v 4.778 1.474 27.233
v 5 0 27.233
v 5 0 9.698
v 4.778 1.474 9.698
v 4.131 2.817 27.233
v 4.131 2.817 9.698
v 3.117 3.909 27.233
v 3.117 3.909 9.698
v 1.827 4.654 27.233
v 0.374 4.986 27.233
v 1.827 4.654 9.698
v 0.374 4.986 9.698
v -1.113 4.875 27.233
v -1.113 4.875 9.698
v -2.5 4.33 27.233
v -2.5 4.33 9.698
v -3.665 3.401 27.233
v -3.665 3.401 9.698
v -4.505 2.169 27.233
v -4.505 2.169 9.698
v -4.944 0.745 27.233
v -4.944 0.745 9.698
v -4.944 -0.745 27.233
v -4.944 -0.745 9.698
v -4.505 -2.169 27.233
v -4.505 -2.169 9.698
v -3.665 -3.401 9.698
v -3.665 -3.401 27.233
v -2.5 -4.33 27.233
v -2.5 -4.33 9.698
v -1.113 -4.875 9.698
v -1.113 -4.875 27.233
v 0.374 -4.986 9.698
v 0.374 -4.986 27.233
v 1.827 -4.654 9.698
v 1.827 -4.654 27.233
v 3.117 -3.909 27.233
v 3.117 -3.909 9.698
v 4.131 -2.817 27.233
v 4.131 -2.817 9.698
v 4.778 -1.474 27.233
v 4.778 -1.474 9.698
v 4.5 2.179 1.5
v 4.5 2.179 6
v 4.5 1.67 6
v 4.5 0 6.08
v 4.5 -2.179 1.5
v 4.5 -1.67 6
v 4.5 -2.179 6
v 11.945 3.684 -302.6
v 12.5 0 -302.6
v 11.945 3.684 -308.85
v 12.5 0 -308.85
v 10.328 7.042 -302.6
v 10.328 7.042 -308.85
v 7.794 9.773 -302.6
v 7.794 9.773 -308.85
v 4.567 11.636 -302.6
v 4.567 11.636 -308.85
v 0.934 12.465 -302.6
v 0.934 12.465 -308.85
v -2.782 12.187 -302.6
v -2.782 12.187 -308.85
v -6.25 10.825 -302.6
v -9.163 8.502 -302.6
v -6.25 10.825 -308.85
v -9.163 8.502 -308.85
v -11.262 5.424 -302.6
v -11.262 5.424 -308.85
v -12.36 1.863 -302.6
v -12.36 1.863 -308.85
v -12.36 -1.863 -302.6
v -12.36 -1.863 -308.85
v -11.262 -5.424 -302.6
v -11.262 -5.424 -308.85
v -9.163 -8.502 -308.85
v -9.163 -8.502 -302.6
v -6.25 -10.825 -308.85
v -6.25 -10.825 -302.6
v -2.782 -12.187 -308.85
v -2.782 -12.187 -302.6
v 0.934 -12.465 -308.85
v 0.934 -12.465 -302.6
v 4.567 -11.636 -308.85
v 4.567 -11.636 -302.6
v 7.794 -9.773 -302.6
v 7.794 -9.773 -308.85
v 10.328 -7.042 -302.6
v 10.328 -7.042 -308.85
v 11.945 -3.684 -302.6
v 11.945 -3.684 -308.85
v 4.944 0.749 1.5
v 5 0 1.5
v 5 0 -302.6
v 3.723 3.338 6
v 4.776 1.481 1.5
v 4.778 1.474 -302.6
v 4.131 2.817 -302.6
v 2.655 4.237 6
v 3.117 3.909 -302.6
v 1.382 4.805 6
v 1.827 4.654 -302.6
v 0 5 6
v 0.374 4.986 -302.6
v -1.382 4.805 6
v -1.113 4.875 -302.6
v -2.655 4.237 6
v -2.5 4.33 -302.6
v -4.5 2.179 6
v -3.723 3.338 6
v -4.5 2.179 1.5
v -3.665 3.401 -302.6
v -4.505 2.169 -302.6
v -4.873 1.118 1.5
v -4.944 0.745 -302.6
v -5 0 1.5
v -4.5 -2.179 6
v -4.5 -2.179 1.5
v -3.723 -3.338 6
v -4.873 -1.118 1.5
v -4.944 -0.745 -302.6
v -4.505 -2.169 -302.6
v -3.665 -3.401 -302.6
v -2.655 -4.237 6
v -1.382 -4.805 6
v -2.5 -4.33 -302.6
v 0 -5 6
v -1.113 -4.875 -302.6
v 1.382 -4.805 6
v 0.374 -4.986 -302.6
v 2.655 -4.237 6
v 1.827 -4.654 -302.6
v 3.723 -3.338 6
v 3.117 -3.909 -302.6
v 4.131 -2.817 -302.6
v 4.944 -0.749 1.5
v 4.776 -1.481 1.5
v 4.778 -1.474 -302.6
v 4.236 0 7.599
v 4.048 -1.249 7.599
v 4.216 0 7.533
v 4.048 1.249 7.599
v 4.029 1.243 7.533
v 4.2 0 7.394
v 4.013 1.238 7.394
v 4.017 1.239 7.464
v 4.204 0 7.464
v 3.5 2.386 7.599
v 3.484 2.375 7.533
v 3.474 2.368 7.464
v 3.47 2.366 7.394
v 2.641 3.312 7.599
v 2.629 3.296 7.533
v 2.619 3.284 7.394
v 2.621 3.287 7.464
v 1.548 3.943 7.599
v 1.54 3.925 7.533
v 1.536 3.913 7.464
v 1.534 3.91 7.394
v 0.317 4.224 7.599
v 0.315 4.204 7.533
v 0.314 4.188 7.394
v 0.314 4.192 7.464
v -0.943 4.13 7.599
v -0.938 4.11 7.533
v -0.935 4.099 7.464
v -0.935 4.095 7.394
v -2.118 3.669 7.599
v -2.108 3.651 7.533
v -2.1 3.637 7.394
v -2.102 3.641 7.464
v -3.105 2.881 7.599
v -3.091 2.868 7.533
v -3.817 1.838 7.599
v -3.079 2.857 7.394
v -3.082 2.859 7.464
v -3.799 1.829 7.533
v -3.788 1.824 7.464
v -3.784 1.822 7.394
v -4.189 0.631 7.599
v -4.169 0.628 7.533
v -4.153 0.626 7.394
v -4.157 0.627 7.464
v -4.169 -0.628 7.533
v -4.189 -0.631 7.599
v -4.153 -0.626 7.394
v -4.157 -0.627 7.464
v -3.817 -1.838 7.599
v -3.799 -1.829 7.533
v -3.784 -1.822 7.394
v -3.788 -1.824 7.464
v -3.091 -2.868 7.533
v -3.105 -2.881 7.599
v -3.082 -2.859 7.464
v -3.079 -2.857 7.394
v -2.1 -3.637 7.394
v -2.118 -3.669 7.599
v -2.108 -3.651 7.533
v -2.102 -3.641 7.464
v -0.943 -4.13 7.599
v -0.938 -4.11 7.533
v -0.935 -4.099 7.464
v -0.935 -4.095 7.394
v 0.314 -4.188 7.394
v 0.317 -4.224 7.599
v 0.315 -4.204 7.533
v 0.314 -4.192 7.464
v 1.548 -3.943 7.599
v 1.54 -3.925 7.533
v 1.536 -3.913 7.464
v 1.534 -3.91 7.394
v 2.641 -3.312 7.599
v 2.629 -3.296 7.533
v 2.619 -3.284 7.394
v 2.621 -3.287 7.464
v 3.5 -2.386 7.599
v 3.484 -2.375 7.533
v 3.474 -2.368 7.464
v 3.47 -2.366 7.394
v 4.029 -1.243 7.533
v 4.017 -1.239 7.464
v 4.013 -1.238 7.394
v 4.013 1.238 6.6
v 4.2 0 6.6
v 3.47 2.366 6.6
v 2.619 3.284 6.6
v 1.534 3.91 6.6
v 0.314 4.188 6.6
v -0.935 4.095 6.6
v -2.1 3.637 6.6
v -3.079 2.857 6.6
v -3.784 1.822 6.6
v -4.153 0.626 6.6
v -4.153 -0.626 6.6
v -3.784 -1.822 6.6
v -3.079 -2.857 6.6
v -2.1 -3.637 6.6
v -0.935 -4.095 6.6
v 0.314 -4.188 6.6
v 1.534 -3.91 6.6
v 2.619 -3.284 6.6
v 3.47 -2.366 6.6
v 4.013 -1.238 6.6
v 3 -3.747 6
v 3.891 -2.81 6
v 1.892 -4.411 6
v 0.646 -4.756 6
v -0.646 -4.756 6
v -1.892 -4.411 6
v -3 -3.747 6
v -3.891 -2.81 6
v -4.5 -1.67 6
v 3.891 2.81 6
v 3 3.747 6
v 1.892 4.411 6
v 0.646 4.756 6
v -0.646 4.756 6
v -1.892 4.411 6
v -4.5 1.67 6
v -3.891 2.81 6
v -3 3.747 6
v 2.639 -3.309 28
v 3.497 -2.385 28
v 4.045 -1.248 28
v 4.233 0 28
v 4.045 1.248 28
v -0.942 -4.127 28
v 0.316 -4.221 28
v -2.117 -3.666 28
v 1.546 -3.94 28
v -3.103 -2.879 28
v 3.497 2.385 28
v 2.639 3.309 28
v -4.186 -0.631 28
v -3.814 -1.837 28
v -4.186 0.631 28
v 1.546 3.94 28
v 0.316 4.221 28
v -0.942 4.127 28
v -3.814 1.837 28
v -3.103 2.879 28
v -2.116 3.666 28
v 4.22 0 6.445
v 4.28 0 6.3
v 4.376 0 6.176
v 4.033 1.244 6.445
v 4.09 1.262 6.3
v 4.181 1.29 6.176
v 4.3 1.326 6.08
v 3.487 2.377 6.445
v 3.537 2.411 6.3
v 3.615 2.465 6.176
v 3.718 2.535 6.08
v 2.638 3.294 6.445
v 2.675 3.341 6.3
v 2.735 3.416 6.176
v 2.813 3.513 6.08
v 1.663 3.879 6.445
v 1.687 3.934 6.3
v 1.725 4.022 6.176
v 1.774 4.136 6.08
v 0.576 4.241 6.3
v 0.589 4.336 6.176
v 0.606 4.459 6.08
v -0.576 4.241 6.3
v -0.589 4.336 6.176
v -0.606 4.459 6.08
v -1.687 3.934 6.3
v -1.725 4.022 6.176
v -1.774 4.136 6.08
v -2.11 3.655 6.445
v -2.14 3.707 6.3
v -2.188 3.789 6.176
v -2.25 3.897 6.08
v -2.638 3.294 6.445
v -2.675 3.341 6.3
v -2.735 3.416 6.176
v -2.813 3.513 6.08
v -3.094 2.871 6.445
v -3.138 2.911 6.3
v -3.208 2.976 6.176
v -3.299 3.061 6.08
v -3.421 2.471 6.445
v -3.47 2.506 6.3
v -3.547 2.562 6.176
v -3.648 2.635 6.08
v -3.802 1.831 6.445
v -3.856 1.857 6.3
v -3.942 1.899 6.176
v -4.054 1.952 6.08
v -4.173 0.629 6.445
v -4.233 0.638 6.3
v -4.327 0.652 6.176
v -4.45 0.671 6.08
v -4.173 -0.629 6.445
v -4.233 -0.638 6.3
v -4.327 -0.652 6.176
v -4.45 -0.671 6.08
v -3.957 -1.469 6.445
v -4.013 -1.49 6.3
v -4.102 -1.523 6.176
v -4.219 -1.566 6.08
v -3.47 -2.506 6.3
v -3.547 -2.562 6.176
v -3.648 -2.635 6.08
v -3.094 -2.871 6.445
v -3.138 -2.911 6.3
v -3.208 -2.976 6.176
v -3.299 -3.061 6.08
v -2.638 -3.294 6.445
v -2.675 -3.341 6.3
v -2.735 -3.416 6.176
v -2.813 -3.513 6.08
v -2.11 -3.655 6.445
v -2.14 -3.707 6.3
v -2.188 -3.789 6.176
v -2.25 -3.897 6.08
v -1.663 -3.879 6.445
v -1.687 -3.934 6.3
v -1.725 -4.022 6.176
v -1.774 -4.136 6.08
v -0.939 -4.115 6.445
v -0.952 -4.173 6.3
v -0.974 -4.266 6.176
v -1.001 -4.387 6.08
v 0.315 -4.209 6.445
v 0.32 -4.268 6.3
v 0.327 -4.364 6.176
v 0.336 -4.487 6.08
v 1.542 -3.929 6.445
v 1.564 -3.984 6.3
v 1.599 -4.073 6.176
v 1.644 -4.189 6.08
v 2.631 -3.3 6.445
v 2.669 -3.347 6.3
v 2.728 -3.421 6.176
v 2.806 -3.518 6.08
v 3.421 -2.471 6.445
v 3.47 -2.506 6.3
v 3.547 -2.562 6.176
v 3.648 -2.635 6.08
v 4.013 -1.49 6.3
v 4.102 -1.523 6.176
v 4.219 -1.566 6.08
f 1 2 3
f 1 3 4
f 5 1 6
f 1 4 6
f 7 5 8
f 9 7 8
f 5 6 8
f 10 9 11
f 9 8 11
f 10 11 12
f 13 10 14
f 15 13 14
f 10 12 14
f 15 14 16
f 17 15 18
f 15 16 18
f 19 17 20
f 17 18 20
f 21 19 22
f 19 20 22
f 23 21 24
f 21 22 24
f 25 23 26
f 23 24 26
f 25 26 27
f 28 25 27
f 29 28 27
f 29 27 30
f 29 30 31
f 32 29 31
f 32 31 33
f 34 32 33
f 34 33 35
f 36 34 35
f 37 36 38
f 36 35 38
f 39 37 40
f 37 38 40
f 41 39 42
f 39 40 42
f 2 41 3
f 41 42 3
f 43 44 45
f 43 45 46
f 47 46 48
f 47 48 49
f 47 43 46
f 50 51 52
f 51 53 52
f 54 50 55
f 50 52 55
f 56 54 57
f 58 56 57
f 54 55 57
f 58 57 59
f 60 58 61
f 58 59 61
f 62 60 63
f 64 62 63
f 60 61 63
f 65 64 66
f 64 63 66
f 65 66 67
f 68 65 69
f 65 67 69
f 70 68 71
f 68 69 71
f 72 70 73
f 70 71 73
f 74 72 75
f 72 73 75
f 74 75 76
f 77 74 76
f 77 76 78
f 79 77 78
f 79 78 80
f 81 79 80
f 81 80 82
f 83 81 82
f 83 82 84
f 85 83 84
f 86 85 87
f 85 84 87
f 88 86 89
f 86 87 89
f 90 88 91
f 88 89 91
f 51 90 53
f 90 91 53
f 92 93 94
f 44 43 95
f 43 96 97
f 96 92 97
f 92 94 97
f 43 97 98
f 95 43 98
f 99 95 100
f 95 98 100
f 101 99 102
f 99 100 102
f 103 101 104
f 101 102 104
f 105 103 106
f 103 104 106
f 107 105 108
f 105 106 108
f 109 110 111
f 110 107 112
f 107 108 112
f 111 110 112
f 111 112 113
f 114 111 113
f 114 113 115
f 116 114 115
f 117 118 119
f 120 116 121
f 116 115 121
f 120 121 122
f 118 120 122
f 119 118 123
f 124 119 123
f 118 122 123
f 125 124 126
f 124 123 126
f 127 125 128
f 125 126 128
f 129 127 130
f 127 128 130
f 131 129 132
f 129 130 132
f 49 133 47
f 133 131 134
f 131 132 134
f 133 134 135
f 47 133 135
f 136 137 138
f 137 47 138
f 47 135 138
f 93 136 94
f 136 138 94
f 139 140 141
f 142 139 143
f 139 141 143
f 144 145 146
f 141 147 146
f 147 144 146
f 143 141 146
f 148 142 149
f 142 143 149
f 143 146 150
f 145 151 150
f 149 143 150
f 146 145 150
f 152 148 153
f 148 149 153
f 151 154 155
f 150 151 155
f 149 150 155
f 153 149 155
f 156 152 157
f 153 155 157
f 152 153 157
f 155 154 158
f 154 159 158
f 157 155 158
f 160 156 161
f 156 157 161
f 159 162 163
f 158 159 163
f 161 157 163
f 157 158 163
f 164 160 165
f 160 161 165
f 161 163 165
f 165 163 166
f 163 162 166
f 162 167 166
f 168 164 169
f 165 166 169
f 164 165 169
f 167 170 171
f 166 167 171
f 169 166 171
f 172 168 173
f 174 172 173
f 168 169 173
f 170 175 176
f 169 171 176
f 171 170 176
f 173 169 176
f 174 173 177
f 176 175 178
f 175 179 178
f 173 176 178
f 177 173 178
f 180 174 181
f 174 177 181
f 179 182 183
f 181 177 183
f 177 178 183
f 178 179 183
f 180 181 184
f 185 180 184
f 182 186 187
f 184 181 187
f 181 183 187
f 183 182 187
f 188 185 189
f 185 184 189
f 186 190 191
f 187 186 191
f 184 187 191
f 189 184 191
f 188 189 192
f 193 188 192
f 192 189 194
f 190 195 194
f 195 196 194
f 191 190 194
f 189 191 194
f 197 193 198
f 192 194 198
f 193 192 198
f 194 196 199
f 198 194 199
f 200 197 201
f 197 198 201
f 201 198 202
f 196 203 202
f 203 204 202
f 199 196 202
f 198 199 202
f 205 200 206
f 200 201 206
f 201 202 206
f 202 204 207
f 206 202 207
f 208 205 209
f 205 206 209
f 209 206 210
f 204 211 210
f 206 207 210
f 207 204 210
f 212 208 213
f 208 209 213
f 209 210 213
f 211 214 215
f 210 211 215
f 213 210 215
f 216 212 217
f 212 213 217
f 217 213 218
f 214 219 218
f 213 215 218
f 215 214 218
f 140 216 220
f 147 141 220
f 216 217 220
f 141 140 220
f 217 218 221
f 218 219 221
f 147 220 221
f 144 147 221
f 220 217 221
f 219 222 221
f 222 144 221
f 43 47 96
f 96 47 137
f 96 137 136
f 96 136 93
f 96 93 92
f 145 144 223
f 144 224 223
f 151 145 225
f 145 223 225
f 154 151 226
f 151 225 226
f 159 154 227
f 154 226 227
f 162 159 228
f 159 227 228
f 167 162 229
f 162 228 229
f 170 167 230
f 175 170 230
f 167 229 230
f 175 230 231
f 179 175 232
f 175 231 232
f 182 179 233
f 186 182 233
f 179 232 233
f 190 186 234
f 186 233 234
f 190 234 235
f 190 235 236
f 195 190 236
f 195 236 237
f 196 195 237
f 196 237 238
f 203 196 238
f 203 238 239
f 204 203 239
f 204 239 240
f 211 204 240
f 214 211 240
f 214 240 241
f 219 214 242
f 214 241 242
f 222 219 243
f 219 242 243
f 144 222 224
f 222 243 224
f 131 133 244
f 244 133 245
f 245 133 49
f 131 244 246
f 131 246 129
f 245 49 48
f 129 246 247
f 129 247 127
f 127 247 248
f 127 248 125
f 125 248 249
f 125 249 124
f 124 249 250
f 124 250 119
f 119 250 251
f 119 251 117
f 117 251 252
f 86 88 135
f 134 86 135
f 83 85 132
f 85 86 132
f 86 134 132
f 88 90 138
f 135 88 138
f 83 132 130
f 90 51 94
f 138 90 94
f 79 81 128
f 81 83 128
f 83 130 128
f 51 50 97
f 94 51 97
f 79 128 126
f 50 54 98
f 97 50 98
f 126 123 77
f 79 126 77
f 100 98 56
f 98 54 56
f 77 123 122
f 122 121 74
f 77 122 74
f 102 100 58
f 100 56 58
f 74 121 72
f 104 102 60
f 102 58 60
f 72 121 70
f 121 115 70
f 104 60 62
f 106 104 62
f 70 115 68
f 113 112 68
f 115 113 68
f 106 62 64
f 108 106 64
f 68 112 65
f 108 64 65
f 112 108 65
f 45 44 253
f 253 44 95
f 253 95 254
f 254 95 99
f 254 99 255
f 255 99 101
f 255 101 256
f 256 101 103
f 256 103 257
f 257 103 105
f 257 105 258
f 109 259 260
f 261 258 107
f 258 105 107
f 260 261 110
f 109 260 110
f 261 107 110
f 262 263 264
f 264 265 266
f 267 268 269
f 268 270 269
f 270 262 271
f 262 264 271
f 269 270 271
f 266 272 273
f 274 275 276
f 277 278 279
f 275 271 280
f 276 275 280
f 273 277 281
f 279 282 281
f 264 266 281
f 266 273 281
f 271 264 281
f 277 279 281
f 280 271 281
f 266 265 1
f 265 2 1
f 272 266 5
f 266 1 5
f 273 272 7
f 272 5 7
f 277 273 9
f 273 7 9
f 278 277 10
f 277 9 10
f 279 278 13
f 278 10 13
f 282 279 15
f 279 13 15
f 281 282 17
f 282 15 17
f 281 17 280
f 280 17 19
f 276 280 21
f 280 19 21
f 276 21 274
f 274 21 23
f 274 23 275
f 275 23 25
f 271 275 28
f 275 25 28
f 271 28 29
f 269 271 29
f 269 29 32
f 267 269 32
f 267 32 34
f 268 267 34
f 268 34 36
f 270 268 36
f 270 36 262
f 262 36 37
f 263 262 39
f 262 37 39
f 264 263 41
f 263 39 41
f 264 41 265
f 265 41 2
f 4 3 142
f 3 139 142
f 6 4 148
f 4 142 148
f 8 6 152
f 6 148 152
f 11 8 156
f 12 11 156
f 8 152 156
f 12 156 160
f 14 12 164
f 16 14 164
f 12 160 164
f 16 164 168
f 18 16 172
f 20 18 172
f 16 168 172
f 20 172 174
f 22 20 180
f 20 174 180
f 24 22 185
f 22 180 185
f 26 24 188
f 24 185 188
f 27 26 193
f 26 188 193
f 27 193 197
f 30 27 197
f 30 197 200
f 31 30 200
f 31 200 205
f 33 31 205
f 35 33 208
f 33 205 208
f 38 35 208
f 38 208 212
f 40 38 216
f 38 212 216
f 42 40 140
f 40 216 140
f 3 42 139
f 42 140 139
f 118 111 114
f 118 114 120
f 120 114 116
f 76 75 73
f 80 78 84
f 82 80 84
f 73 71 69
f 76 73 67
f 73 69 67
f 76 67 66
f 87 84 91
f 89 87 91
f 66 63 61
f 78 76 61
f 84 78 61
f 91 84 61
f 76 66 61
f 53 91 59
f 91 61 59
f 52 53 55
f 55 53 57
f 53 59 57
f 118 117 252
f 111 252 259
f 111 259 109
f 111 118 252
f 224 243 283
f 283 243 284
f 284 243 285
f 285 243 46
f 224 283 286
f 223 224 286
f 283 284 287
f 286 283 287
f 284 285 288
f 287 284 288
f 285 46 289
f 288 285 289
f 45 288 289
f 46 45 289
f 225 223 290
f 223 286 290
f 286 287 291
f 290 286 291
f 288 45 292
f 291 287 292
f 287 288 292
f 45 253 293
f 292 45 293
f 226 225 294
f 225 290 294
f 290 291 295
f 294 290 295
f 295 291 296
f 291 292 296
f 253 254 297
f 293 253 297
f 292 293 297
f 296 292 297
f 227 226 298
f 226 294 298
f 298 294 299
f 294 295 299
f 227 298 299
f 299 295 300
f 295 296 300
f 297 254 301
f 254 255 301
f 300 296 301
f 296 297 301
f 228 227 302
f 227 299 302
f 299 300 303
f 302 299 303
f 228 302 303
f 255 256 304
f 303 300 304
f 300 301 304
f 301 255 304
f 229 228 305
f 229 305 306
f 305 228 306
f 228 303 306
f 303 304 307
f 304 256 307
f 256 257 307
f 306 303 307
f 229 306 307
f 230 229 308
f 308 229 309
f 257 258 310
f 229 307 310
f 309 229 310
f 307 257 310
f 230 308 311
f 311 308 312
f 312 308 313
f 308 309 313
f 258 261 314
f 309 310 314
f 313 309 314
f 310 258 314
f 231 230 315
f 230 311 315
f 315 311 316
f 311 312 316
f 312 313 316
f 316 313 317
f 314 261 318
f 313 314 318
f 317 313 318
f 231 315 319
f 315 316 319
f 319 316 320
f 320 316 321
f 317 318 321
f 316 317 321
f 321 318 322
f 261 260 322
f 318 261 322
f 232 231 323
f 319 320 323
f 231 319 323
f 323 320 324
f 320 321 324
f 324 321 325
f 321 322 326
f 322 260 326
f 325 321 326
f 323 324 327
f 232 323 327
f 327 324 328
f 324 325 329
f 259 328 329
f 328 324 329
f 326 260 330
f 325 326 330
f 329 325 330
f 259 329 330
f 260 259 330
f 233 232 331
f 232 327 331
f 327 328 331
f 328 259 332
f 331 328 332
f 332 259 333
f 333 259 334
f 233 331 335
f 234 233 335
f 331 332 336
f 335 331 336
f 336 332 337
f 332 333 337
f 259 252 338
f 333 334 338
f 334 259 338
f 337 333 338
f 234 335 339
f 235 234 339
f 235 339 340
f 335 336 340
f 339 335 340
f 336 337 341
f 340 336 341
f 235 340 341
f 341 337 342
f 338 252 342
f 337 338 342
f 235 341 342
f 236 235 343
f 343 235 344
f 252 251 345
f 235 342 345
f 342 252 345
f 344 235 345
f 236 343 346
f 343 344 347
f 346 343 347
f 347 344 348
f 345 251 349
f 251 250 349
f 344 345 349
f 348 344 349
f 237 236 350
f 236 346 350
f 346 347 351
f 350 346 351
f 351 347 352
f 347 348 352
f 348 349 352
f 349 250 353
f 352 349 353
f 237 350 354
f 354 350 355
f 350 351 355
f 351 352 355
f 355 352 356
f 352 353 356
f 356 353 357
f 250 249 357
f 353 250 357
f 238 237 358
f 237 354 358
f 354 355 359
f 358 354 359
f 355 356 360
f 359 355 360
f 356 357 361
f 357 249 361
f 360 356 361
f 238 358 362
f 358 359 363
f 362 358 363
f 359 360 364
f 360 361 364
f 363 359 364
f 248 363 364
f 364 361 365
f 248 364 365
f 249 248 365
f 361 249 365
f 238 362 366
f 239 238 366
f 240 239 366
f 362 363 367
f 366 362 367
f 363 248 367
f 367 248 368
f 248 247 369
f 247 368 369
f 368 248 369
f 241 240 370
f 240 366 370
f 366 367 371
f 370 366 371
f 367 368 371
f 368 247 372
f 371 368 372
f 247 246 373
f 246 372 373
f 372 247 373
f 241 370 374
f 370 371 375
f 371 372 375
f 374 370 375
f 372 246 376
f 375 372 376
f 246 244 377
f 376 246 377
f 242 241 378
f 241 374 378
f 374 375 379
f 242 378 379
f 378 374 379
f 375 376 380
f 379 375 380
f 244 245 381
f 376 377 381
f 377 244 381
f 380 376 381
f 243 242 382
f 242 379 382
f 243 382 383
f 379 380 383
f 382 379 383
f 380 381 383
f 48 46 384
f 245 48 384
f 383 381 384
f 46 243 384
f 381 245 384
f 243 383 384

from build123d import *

# Parameters (mm, degrees)
SCHNITT_LINEAR_AUSTRAGEN1_DEPTH = 5.5


with BuildPart() as part:
    # Skizze1 → Rotation1 (revolve)
    with BuildSketch(Plane(origin=(0, 0, 0), x_dir=(0, 0, -1), z_dir=(1, 0, 0))):
        Polygon((-6, 0), (-6, 5), (302.6, 5), (302.6, 12.5), (308.85, 12.5), (308.85, 0), align=None)
    revolve(axis=Axis((0, 0, -308.85), (0, 0, 1)))

    # Skizze2 → Rotation2 (revolve)
    with BuildSketch(Plane(origin=(0, 0, 0), x_dir=(0, 0, -1), z_dir=(1, 0, 0))):
        with BuildLine():
            Line((-28, 0), (-28, 4.233))
            Line((-28, 4.233), (-27.233, 5))
            Line((-27.233, 5), (-9.697981936, 5))
            Line((-9.697981936, 5), (-7.599415898, 4.236184428))
            ThreePointArc((-7.599415898, 4.236184428), (-7.498392718, 4.209115348), (-7.394203812, 4.2))
            Line((-7.394203812, 4.2), (-6.6, 4.2))
            ThreePointArc((-6.6, 4.2), (-6.175735931, 4.375735931), (-6, 4.8))
            Line((-6, 4.8), (-6, 5))
            Line((-6, 5), (-5, 5))
            Line((-5, 5), (-5, 0))
            Line((-5, 0), (-28, 0))
        make_face()
    revolve(axis=Axis((0, 0, 5), (0, 0, 1)))

    # Skizze3 → Schnitt-Linear austragen1 (cut)
    with BuildSketch(Plane.XY.offset(1.5)):
        Polygon((-9, 18), (-9, -9), (-4.5, -9), (-4.5, 9), (4.5, 9), (4.5, -9), (9, -9), (9, 18), align=None)
    extrude(amount=SCHNITT_LINEAR_AUSTRAGEN1_DEPTH, mode=Mode.SUBTRACT)


solid = part.part
